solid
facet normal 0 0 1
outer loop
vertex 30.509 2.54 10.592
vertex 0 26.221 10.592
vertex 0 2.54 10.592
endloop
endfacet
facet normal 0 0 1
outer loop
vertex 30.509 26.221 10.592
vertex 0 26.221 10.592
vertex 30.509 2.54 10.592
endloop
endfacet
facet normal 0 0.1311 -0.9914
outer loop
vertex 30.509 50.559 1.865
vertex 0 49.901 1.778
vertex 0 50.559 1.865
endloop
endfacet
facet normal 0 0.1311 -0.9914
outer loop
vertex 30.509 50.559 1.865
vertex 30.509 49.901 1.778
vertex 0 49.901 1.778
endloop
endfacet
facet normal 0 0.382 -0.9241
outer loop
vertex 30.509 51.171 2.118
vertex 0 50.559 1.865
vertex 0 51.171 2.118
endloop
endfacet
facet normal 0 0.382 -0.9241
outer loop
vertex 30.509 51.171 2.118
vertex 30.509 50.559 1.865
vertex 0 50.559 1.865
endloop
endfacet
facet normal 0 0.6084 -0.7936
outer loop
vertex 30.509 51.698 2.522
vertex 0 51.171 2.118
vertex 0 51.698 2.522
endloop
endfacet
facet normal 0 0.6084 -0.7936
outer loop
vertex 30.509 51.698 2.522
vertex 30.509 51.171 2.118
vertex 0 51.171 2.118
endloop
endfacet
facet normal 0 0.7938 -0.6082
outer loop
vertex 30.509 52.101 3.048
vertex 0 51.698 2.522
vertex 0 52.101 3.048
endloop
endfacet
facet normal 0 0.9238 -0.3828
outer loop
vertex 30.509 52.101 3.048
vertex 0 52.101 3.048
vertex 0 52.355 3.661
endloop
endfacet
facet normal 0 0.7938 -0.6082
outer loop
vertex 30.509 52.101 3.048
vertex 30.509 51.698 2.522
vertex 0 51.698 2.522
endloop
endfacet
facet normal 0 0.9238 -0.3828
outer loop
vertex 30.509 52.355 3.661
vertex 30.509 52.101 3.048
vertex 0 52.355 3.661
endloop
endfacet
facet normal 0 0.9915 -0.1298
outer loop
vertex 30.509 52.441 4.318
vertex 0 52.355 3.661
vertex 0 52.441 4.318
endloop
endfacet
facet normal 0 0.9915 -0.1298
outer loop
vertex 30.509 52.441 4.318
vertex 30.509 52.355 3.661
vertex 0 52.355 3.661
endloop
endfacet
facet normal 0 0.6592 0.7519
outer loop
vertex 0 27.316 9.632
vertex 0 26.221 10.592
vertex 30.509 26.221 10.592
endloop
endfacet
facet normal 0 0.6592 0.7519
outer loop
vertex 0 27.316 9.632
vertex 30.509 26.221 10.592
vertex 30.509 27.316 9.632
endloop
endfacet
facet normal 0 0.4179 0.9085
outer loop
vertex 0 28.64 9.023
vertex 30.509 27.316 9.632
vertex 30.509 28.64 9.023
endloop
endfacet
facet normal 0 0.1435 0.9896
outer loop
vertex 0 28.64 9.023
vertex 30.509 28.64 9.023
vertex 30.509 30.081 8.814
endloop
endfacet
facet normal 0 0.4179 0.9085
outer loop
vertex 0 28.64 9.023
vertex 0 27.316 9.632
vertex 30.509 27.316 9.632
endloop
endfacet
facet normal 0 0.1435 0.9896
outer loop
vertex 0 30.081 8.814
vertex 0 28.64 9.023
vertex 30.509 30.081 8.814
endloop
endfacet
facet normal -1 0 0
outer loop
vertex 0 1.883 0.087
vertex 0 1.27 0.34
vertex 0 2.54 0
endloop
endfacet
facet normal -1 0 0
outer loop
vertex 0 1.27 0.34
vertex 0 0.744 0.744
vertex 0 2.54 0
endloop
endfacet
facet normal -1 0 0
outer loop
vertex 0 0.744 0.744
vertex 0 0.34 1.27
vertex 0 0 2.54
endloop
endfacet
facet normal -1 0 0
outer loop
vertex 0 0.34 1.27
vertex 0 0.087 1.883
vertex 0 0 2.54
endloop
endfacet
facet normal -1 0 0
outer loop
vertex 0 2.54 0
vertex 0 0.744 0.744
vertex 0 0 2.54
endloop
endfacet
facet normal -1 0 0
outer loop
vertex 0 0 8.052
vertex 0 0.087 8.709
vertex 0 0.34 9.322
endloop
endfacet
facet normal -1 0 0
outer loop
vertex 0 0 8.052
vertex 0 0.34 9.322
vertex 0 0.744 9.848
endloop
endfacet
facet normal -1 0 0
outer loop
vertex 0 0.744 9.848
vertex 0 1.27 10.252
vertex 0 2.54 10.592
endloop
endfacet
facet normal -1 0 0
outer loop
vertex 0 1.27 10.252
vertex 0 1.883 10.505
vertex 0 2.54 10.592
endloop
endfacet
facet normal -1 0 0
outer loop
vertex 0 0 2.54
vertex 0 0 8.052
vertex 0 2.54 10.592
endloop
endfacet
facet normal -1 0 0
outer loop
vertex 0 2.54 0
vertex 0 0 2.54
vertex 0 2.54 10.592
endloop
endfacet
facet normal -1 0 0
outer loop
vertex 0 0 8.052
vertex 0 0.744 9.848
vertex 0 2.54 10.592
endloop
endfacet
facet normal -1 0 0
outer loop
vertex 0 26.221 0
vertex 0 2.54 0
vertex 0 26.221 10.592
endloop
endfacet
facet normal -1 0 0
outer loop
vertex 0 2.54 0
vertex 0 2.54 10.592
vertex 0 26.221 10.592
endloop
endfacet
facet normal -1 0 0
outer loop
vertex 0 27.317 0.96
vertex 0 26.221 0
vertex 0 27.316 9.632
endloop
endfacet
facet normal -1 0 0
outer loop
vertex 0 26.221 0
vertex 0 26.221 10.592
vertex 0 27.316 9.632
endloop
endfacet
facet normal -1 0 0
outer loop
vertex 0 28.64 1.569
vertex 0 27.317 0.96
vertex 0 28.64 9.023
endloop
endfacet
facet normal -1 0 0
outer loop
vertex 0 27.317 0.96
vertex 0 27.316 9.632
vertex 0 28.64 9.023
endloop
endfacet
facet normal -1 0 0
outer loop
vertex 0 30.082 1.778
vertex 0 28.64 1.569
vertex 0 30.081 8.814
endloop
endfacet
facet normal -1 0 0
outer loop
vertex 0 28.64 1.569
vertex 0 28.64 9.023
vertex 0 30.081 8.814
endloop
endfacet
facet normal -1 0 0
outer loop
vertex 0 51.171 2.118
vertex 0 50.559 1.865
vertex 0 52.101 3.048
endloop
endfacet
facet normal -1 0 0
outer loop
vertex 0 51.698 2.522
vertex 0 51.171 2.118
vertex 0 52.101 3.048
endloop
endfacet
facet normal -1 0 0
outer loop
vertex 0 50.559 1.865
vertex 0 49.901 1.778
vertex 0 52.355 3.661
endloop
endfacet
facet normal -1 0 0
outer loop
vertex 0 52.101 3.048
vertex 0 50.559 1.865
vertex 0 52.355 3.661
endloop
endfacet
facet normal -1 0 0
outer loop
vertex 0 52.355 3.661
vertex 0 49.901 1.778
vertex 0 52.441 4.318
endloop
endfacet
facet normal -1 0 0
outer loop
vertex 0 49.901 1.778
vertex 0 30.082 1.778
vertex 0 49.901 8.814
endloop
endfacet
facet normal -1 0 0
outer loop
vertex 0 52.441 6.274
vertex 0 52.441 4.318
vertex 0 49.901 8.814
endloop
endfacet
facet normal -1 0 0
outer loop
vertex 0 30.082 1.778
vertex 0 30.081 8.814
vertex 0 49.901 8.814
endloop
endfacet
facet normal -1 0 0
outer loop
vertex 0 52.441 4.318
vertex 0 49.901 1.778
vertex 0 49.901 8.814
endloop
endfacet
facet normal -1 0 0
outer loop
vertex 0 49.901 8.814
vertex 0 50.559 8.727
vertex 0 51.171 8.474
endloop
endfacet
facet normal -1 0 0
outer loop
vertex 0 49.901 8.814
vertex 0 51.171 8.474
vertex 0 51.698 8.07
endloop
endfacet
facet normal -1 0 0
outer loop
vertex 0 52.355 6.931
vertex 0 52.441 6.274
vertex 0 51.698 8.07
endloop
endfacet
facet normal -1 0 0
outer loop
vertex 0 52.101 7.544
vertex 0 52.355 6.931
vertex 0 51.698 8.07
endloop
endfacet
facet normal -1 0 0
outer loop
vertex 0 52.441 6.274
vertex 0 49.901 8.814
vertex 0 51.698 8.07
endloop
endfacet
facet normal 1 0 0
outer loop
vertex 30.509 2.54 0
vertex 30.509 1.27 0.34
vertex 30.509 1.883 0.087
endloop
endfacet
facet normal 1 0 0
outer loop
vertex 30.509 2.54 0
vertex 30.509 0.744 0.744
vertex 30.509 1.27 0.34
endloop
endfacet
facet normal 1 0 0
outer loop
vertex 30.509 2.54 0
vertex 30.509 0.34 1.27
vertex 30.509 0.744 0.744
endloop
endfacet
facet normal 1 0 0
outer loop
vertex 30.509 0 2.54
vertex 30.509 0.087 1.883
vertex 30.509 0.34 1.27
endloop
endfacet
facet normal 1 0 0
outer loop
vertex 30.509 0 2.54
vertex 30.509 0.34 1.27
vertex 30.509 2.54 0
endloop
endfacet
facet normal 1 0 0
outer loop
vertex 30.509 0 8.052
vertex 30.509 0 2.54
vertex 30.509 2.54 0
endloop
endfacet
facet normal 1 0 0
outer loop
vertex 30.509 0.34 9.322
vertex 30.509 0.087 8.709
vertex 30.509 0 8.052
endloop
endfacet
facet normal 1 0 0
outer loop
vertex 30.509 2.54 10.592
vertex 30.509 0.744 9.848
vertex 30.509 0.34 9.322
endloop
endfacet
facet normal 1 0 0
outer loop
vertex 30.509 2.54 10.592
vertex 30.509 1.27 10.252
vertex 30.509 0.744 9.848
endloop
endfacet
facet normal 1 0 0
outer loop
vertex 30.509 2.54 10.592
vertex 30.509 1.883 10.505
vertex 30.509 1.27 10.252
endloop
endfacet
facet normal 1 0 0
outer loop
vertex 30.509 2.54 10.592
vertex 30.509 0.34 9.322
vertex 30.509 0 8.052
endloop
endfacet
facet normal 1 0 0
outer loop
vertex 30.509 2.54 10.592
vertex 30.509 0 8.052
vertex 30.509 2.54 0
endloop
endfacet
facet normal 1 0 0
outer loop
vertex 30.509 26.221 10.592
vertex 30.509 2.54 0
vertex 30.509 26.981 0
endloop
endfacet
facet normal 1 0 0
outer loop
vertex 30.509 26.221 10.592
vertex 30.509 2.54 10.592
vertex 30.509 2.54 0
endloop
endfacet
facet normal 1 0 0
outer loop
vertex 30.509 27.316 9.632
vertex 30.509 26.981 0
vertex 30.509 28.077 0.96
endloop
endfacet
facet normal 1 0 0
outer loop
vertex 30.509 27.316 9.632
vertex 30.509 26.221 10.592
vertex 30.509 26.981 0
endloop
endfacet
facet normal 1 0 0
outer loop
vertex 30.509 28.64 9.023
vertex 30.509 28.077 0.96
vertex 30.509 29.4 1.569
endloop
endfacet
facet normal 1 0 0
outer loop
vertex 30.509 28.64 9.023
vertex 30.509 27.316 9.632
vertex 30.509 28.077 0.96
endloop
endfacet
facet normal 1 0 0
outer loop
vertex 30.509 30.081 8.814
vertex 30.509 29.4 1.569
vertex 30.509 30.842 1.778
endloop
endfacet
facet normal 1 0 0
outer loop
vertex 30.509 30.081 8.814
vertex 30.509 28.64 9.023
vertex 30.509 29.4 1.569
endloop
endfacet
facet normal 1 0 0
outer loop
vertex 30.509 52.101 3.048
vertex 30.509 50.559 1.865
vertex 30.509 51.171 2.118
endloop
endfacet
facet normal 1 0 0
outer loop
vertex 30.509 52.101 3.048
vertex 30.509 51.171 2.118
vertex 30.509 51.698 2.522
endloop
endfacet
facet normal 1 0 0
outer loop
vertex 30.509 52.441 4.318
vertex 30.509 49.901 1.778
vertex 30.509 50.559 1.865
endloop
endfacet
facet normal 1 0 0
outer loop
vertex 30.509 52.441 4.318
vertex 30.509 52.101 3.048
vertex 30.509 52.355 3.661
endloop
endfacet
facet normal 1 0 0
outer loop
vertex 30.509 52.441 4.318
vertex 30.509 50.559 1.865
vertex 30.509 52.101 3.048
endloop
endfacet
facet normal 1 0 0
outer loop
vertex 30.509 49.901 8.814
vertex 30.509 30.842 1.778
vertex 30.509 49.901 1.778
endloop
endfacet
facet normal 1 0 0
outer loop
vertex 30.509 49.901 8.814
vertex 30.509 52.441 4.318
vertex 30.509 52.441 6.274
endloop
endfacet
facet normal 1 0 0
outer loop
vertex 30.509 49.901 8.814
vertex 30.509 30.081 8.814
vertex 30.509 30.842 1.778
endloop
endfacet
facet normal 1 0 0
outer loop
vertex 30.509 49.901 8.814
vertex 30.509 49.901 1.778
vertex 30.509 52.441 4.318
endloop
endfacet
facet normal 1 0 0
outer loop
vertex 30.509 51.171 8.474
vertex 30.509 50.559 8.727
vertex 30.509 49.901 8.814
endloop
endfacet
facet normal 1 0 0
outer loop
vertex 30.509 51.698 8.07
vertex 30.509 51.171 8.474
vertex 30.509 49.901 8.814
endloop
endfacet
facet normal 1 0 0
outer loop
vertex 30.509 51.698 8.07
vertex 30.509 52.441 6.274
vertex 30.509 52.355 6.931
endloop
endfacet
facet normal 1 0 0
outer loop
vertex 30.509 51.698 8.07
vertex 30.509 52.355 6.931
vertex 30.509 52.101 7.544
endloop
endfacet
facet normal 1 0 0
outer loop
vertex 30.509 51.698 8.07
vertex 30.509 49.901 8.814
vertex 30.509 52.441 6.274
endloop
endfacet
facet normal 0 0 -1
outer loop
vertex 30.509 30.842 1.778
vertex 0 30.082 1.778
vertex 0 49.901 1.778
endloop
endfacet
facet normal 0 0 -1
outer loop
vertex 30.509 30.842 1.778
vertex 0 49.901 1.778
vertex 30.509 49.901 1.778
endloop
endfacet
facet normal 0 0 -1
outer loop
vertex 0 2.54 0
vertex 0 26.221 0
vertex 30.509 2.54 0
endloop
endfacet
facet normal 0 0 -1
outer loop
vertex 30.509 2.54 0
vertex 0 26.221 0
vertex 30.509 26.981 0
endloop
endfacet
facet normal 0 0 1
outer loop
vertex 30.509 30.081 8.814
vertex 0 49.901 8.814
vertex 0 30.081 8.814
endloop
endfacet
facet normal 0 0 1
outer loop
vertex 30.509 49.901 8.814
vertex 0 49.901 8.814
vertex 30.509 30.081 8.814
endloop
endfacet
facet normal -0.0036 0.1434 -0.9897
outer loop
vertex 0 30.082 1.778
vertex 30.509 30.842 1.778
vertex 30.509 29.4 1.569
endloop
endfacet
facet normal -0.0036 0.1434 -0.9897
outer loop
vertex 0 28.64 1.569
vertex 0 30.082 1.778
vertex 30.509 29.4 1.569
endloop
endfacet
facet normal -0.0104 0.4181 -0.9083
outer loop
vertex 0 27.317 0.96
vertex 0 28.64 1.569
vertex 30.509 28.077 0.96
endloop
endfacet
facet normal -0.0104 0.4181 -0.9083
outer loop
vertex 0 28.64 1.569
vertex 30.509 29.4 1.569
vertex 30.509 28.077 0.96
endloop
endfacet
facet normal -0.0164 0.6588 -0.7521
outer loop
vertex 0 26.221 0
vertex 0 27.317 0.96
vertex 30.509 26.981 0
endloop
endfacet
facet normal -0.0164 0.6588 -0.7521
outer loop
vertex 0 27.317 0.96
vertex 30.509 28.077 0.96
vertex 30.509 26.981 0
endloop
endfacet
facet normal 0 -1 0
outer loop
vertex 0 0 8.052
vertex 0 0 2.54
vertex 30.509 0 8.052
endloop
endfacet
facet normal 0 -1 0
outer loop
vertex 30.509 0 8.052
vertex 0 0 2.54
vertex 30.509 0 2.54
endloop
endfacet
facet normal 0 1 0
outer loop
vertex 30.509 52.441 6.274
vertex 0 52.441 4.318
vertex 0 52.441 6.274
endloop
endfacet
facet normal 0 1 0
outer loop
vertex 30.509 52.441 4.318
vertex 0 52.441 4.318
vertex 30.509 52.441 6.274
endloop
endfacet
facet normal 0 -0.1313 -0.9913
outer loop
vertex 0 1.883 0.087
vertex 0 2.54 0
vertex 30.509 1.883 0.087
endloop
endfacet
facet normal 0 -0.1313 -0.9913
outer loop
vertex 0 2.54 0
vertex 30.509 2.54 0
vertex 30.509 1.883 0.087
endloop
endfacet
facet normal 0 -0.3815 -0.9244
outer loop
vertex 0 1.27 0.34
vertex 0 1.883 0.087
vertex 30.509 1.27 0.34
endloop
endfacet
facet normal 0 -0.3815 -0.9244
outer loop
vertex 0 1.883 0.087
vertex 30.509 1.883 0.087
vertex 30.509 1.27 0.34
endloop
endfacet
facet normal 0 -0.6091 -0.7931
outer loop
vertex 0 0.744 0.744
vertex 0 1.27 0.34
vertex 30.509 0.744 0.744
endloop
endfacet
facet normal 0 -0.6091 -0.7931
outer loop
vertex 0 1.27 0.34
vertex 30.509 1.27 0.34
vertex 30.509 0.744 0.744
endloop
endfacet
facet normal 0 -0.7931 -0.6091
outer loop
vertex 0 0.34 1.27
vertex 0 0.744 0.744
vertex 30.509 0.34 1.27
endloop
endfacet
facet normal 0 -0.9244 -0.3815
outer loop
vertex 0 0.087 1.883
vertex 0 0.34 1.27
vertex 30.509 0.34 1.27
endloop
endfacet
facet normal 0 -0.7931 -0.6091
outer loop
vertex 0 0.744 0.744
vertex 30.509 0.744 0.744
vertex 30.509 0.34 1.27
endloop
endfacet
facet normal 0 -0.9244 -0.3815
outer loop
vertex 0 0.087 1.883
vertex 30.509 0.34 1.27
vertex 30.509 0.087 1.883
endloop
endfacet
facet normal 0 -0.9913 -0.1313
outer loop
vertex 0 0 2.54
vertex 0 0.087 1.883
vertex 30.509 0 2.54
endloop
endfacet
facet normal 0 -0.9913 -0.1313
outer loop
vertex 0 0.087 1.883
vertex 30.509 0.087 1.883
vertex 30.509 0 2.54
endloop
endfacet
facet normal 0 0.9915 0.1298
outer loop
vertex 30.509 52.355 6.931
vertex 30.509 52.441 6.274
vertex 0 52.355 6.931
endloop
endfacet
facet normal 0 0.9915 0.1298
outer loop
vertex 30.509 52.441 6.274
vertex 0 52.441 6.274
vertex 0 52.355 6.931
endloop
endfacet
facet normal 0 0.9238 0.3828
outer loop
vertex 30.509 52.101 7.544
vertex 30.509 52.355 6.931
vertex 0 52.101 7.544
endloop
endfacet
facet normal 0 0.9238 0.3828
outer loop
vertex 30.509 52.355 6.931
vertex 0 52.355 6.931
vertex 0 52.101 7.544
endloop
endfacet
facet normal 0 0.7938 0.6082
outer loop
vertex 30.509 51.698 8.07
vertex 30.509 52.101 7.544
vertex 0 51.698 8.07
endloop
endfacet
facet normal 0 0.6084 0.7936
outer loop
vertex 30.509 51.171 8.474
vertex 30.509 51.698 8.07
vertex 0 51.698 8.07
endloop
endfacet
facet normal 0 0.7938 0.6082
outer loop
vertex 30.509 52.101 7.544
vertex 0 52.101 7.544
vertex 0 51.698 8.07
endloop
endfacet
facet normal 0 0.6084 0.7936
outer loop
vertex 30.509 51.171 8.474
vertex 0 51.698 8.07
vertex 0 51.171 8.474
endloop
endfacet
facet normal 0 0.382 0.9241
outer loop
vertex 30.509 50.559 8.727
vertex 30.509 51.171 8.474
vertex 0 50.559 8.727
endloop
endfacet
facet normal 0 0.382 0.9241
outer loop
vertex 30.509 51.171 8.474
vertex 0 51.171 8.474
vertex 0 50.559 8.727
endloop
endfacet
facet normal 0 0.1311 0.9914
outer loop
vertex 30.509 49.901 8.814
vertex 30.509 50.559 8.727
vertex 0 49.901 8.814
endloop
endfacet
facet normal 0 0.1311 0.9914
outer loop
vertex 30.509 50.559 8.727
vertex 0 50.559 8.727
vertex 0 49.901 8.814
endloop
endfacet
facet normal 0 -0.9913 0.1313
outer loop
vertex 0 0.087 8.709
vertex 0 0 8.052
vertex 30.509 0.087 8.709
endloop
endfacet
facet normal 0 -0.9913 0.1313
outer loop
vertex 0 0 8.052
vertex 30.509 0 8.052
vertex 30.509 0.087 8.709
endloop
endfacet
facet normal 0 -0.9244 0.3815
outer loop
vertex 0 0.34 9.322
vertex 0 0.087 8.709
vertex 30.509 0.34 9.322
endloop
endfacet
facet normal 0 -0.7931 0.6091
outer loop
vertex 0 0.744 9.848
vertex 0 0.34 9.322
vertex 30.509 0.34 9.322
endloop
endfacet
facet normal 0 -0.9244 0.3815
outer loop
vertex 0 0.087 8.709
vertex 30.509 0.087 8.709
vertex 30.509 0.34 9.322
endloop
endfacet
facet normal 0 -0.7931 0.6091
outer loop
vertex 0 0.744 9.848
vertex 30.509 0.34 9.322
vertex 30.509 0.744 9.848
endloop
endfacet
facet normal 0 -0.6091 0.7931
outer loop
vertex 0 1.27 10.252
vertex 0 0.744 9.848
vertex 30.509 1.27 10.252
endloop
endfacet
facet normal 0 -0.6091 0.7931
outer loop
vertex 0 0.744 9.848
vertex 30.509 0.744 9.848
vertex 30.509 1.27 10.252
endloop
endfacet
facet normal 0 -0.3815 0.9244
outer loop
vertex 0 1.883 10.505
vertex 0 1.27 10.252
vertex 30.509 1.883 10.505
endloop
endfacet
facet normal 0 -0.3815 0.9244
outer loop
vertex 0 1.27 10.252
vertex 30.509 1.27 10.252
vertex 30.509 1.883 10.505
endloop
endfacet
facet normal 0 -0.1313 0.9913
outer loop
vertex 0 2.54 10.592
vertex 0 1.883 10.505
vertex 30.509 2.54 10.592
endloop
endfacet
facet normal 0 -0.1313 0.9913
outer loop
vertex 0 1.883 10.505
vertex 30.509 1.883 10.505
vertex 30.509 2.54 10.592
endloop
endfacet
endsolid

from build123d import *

# Parameters (mm, degrees)
F0_W        = 30.5091738701
F0_H        = 52.441470325
F1_DEPTH    = 10.5918
F3_DEPTH    = 1.778
F5_DEPTH    = 1.778
F6_T1_DEPTH = 30.5091738701
F6_T6_DEPTH = 49.8209621392
F7_R        = 2.54


# Not quite as in the source:
# - a fillet or chamfer that OpenCascade refuses, or shapes differently, is made with other operations: its cross-section is extruded or revolved along the edge and cut away or added


with BuildPart() as f1:
    # F0 (on Top) → F1 (new body)
    with BuildSketch(Plane.XY):
        with Locations((15.254586935, 26.2207351625)):
            Rectangle(F0_W, F0_H)
    extrude(amount=F1_DEPTH)

    # F2 (on face) → F3 (cut)
    with BuildSketch(Plane.XY.offset(10.5918)):
        Polygon((27.9714719847, 52.441470325), (0, 52.441470325), (0, 27.7975574136), (0, 26.2207351625), (30.5091738701, 26.2207351625), (30.5091738701, 52.4368782499), align=None)
    extrude(amount=-F3_DEPTH, mode=Mode.SUBTRACT)

    # F4 (on face) → F5 (cut)
    with BuildSketch(Plane(origin=(0, 0, 0), x_dir=(1, 0, 0), z_dir=(0, 0, -1))):
        Polygon((30.5091738701, -26.980528608), (0, -26.2207351625), (0, -52.441470325), (30.5091738701, -52.441470325), align=None)
    extrude(amount=-F5_DEPTH, mode=Mode.SUBTRACT)

    # F6: fillet of radius 5.08 on 2 edges, made by hand

    # F6_s2 → F6_t1 (join)
    with BuildSketch(Plane.YZ):
        with BuildLine():
            ThreePointArc((26.2207351625, 10.5918), (27.9560844701, 9.2796608604), (30.0812009375, 8.8138))
            Line((30.0812009375, 8.8138), (26.2207351625, 8.8138))
            Line((26.2207351625, 8.8138), (26.2207351625, 10.5918))
        make_face()
    extrude(amount=F6_T1_DEPTH)


with BuildPart() as f6_tool4:
    # F6_s5 → F6_t6 (new body)
    with BuildSketch(Plane(origin=(40.8099373033, 1.0163212877, 0), x_dir=(0, 0, 1), z_dir=(-0.9996900453, -0.0248960508, 0))):
        with BuildLine():
            ThreePointArc((1.778, 30.0730736971), (1.3121391396, 27.9479572297), (0, 26.2126079221))
            Line((0, 26.2126079221), (1.778, 26.2126079221))
            Line((1.778, 26.2126079221), (1.778, 30.0730736971))
        make_face()
    extrude(amount=F6_T6_DEPTH)

    split(bisect_by=Plane.YZ, keep=Keep.TOP)

    split(bisect_by=Plane.YZ.offset(30.5091738701), keep=Keep.BOTTOM)


with BuildPart() as f1_1:
    add(f1.part)

    # F6_t3: union F6_tool4
    add(f6_tool4.part)

    # F7
    f7_edges = [f1_1.edges().sort_by_distance(p)[0] for p in [
        (15.254587, 52.44147, 1.778),
        (15.254587, 0, 0),
        (15.254587, 0, 10.5918),
        (13.985736, 52.44147, 8.8138),
    ]]
    fillet(f7_edges, radius=F7_R)


solid = f1_1.part
